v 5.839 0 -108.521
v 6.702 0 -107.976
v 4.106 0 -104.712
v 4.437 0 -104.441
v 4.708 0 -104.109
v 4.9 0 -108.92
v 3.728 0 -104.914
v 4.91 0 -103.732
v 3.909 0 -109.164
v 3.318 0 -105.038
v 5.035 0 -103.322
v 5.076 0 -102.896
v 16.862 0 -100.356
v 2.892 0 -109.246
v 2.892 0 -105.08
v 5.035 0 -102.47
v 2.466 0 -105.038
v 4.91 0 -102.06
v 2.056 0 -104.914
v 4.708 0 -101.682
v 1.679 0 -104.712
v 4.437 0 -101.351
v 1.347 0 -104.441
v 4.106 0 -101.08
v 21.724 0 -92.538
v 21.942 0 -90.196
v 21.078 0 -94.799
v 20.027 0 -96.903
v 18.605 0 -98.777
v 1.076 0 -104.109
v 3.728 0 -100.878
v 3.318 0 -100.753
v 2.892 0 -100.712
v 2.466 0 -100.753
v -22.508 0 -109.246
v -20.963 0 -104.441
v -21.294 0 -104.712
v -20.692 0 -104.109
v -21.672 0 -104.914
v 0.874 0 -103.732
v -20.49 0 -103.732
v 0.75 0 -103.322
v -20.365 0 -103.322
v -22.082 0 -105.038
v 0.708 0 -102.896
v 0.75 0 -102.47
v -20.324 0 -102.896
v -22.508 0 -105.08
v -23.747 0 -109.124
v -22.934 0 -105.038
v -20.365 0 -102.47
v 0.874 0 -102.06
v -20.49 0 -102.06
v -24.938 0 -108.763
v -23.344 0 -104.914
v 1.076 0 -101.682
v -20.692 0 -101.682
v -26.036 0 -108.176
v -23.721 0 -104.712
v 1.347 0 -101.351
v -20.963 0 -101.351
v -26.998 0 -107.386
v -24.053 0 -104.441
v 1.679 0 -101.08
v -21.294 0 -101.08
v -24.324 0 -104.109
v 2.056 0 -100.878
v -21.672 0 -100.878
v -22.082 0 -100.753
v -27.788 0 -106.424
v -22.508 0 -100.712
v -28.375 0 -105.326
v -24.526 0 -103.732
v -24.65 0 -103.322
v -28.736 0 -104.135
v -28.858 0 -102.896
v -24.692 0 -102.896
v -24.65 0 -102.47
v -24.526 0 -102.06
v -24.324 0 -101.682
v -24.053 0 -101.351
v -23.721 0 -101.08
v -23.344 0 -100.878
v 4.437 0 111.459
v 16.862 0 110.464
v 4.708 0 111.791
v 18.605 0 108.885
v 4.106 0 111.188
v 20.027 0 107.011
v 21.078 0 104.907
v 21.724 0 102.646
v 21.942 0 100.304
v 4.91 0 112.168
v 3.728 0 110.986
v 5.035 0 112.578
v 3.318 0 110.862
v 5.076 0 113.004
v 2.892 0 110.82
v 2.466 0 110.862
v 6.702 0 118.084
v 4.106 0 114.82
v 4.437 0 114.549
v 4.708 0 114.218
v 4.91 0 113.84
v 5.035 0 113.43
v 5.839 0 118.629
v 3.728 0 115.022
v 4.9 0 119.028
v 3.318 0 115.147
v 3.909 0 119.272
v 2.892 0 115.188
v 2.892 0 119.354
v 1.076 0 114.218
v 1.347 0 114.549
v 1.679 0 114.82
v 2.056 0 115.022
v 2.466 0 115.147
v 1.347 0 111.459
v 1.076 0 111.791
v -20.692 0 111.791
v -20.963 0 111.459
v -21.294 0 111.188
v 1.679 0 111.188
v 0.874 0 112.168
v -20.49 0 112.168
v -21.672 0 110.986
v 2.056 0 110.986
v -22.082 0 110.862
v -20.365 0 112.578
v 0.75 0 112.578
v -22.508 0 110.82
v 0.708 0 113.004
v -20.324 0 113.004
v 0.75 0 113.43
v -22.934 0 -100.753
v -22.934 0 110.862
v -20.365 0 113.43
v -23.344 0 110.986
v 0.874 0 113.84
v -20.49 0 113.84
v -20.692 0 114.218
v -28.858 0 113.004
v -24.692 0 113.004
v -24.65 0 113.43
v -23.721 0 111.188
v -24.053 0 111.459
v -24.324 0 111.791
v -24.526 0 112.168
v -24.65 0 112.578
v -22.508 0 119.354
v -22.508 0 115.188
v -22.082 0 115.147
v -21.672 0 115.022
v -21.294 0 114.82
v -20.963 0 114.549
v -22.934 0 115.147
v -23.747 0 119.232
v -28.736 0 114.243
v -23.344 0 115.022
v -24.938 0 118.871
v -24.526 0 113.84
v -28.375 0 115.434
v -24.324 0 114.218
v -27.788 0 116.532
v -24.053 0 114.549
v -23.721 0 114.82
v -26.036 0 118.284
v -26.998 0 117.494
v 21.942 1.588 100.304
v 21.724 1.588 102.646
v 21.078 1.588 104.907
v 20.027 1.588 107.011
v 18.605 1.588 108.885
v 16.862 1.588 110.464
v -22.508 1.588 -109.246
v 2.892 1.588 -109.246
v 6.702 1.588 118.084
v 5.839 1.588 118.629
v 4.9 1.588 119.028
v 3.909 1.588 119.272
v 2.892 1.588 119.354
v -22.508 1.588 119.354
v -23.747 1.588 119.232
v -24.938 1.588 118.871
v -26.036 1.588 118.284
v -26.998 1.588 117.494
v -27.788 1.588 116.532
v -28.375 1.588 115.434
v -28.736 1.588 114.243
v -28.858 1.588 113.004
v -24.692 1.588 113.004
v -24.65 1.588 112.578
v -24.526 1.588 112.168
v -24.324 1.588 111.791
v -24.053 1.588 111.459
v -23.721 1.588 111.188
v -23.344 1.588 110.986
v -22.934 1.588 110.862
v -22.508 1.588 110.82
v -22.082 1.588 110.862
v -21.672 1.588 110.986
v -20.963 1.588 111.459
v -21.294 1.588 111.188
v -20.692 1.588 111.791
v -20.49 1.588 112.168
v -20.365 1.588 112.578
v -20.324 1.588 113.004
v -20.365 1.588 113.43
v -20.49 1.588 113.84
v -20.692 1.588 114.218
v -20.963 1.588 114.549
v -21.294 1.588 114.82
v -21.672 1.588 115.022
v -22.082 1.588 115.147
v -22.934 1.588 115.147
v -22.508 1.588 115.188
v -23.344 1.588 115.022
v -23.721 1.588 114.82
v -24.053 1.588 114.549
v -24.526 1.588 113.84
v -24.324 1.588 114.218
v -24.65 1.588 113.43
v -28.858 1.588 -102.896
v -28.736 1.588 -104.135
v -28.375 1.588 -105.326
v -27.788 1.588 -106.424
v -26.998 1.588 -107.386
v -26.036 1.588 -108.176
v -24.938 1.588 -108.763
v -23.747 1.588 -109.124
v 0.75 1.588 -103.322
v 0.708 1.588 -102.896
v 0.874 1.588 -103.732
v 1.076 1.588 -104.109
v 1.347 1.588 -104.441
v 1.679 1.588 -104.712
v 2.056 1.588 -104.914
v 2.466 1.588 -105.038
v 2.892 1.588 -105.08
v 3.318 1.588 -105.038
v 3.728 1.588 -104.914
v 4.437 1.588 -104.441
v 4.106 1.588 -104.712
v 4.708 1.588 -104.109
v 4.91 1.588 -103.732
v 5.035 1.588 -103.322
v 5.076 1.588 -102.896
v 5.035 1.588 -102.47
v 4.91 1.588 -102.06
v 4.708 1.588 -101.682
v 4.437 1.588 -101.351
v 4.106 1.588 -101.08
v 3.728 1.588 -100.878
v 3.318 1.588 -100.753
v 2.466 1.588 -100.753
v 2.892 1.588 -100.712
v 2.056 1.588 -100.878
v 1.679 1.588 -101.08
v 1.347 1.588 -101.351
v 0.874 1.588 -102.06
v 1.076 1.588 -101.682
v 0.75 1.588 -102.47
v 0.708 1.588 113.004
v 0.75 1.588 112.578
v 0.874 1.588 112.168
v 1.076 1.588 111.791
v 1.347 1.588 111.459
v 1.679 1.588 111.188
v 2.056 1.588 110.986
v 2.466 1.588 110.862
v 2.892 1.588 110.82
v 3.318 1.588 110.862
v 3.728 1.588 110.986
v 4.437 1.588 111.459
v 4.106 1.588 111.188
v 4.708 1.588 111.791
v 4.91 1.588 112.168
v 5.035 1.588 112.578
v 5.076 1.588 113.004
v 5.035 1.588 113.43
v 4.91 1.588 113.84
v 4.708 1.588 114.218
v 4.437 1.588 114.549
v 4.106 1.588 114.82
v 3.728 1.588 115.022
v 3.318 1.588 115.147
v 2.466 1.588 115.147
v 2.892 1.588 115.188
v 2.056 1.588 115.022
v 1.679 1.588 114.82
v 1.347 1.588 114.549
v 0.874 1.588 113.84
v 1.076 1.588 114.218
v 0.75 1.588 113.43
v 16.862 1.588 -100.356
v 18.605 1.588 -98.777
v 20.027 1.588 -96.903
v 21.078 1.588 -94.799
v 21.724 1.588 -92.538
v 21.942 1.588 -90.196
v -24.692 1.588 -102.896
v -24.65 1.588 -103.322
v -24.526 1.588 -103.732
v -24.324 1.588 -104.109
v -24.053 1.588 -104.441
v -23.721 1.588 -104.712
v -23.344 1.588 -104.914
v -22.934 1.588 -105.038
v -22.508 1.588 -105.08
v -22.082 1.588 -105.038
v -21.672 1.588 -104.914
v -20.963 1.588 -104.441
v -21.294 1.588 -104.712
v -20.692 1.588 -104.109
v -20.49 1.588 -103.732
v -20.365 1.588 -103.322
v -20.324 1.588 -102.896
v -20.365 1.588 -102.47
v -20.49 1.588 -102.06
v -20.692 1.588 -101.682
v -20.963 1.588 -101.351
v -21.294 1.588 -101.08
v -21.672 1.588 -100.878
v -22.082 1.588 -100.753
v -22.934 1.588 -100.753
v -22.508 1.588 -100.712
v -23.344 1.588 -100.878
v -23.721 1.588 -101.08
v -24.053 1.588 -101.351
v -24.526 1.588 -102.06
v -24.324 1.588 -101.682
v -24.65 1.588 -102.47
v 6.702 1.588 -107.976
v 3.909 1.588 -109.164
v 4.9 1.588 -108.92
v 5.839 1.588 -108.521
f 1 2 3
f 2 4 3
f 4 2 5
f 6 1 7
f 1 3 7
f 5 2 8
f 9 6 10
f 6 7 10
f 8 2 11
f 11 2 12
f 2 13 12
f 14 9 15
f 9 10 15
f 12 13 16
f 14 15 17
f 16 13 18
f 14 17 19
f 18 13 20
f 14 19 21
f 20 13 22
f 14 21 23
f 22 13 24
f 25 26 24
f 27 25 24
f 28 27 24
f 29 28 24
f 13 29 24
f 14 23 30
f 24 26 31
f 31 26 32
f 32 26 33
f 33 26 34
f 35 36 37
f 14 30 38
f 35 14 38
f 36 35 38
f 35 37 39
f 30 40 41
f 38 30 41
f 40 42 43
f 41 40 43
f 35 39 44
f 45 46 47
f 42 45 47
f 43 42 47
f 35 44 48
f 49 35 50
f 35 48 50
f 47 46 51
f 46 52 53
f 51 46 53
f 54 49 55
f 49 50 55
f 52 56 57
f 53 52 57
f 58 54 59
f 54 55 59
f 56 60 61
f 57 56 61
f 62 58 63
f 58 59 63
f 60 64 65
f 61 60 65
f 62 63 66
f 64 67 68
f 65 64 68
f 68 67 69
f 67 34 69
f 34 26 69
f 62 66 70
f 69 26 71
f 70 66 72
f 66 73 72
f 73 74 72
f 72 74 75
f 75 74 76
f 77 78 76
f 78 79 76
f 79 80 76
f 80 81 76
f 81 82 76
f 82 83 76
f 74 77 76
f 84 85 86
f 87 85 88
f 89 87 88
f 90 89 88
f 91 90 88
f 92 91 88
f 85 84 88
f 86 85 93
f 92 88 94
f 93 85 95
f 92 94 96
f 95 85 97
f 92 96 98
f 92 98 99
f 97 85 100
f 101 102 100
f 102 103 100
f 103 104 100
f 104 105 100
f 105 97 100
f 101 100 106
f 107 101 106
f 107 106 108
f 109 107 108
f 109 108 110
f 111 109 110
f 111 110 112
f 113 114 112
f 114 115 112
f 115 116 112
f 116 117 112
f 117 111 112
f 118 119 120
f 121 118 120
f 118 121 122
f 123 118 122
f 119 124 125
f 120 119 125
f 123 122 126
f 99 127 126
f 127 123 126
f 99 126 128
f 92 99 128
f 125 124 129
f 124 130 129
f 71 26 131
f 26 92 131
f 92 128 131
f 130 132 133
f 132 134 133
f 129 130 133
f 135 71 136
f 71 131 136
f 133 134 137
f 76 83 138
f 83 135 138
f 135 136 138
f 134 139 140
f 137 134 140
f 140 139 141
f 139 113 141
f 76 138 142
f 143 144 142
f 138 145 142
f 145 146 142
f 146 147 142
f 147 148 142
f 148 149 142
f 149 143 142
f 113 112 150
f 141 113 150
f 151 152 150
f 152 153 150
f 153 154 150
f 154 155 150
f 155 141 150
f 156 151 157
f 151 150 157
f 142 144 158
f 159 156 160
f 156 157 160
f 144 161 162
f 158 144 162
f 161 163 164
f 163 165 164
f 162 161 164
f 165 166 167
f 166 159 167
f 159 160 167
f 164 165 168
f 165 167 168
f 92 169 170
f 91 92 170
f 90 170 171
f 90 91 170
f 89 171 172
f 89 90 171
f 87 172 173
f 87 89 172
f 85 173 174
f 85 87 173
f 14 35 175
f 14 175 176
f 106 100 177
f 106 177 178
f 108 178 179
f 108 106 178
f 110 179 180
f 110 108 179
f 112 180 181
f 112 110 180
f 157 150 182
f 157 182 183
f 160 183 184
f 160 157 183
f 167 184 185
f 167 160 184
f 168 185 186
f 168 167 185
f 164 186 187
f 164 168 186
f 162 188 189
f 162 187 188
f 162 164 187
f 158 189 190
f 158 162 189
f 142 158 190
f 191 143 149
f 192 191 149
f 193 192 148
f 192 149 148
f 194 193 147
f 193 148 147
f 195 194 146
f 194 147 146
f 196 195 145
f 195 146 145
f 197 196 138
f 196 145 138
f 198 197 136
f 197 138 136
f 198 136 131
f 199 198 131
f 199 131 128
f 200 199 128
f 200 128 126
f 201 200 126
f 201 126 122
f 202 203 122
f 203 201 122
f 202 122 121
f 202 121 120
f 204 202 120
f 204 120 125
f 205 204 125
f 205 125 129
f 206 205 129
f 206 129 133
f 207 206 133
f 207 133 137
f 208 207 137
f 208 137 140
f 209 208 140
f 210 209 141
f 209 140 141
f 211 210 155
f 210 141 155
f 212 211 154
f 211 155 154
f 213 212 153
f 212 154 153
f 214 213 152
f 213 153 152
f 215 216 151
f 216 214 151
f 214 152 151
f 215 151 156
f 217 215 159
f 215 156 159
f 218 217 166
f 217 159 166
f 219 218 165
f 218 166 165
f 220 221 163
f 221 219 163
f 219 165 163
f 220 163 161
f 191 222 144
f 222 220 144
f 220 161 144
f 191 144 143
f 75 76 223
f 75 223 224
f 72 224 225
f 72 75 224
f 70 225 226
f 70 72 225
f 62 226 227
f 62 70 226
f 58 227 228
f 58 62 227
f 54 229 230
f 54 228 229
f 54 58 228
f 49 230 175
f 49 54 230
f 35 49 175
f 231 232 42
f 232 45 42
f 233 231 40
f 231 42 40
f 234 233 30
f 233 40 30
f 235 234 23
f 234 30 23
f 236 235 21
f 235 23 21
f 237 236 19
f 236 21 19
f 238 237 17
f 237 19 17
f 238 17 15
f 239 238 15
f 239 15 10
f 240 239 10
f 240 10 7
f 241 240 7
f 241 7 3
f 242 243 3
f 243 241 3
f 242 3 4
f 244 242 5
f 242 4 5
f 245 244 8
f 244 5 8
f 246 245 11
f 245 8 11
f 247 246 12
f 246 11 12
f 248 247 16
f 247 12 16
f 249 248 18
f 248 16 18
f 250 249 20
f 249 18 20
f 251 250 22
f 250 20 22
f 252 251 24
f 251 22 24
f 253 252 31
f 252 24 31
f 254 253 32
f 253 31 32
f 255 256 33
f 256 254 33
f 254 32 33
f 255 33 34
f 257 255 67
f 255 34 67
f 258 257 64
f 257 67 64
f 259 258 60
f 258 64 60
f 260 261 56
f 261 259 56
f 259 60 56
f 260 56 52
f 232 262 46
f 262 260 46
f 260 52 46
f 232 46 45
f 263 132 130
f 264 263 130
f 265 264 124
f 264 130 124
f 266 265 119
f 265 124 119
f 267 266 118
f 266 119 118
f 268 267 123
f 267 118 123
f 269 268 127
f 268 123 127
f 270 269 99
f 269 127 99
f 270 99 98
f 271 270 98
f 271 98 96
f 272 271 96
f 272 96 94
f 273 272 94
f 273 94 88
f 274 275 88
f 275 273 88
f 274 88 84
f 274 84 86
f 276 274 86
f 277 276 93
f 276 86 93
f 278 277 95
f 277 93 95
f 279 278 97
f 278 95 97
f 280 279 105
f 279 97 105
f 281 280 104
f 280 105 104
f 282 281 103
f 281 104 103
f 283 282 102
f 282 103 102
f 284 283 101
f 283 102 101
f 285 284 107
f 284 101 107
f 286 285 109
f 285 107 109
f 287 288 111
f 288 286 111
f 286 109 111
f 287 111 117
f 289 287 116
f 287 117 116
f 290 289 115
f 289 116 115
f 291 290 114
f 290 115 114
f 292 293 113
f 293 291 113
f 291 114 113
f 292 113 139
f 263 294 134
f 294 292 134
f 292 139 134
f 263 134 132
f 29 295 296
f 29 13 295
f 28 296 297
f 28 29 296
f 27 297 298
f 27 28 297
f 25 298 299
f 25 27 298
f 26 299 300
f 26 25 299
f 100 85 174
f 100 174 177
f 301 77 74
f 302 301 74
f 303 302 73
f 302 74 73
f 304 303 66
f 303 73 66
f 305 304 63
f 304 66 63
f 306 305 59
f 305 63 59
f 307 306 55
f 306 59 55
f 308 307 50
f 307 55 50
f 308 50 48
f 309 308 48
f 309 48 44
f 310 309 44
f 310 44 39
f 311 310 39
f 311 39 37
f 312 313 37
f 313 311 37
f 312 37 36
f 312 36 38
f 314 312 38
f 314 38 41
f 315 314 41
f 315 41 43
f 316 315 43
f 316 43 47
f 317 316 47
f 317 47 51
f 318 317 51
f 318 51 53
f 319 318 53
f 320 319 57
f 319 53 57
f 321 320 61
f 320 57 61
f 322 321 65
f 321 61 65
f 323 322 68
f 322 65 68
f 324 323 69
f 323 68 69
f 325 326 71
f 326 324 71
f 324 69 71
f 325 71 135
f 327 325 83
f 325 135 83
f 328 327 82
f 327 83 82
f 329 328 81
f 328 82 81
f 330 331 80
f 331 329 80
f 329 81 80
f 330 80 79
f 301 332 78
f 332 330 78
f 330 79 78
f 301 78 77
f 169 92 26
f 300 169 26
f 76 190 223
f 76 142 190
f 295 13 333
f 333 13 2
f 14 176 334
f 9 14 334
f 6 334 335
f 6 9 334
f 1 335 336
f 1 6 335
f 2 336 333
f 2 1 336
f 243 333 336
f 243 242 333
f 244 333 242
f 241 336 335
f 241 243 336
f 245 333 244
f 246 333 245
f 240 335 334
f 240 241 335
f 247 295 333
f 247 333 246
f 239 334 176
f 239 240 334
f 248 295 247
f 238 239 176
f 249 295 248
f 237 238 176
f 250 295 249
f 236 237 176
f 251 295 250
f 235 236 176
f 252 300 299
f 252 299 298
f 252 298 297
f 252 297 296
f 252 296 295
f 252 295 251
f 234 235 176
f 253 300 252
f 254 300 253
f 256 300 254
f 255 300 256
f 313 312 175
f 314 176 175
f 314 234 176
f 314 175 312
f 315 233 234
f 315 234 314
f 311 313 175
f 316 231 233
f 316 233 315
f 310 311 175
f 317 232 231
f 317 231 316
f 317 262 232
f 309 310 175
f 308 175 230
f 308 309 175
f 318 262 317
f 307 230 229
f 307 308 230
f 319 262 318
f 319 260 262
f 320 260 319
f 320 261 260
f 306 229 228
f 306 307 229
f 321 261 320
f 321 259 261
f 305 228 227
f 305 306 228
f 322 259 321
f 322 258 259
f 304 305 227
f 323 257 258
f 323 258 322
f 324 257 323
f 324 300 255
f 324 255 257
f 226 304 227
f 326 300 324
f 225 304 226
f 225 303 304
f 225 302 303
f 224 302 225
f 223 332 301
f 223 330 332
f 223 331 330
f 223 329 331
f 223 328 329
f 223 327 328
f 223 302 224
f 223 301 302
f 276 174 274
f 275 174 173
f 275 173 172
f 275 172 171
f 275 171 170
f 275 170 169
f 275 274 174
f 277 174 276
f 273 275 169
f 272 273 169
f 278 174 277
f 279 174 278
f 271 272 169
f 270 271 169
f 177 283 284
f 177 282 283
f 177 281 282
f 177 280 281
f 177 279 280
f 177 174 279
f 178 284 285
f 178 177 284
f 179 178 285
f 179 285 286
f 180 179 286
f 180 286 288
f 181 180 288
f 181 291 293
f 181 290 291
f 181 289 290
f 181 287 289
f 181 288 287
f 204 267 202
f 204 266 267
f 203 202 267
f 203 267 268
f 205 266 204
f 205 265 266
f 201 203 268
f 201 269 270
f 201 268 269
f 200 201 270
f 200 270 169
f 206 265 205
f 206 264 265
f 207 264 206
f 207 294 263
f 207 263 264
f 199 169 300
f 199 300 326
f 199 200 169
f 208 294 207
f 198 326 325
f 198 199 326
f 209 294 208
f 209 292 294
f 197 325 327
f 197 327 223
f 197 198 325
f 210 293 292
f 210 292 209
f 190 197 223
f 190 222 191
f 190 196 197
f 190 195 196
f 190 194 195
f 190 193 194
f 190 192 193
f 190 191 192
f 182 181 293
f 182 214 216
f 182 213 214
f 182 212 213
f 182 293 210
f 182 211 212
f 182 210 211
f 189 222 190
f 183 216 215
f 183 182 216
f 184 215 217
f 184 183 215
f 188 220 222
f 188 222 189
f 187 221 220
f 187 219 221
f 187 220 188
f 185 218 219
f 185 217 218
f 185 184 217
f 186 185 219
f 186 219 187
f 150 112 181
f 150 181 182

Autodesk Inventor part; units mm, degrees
ref_plane "YZ Plane" through (0, 0, 0) normal (1, 0, 0) x (0, 1, 0)
ref_plane "XZ Plane" through (0, 0, 0) normal (0, 1, 0) x (-1, 0, 0)
ref_plane "XY Plane" through (0, 0, 0) normal (0, 0, 1) x (1, 0, 0)
sketch "Sketch1" plane through (0, 0, 0) normal (0, 1, 0) x (-1, 0, 0)
  circle A0 centre (-2.8921, -102.8959) radius 2.1844
  circle A1 centre (22.5079, -102.8959) radius 2.1844
  circle A2 centre (-2.8921, 113.0041) radius 2.1844
  circle A3 centre (22.5079, 113.0041) radius 2.1844
  arc A4 (28.8579, 113.0041) -> (22.5079, 119.3541) centre (22.5079, 113.0041) ccw
  arc A5 (-2.8921, 119.3541) -> (-6.7021, 118.0841) centre (-2.8921, 113.0041) ccw
  arc A6 (-6.7021, -107.9759) -> (-2.8921, -109.2459) centre (-2.8921, -102.8959) ccw
  arc A7 (22.5079, -109.2459) -> (28.8579, -102.8959) centre (22.5079, -102.8959) ccw
  line L0 (-2.8921, 119.3541) -> (22.5079, 119.3541)
  line L1 (28.8579, 113.0041) -> (28.8579, -102.8959)
  line L2 (22.5079, -109.2459) -> (-2.8921, -109.2459)
  line L3 (-16.8621, 110.4641) -> (-6.7021, 118.0841)
  line L4 (-16.8621, -100.3559) -> (-6.7021, -107.9759)
  line L5 (-21.9421, 100.3041) -> (-21.9421, -90.1959)
  arc A8 (-16.8621, 110.4641) -> (-21.9421, 100.3041) centre (-9.2421, 100.3041) ccw
  arc A9 (-21.9421, -90.1959) -> (-16.8621, -100.3559) centre (-9.2421, -90.1959) ccw
  line L6 (-2.8921, 119.3541) -> (22.5079, 119.3541)
  line L7 (22.5079, -109.2459) -> (-2.8921, -109.2459)
  line L8 (28.8579, 113.0041) -> (28.8579, -102.8959)
  point P0 (0, 0)
  dimension "d0" = 12.7
  dimension "d1" = 12.7
  dimension "d2" = 12.7
  dimension "d3" = 12.7
extrude "Extrusion1" add sketch "Sketch1" along normal blind 1.5875
properties part number "Wedge" material "Acetal Resin, White"
